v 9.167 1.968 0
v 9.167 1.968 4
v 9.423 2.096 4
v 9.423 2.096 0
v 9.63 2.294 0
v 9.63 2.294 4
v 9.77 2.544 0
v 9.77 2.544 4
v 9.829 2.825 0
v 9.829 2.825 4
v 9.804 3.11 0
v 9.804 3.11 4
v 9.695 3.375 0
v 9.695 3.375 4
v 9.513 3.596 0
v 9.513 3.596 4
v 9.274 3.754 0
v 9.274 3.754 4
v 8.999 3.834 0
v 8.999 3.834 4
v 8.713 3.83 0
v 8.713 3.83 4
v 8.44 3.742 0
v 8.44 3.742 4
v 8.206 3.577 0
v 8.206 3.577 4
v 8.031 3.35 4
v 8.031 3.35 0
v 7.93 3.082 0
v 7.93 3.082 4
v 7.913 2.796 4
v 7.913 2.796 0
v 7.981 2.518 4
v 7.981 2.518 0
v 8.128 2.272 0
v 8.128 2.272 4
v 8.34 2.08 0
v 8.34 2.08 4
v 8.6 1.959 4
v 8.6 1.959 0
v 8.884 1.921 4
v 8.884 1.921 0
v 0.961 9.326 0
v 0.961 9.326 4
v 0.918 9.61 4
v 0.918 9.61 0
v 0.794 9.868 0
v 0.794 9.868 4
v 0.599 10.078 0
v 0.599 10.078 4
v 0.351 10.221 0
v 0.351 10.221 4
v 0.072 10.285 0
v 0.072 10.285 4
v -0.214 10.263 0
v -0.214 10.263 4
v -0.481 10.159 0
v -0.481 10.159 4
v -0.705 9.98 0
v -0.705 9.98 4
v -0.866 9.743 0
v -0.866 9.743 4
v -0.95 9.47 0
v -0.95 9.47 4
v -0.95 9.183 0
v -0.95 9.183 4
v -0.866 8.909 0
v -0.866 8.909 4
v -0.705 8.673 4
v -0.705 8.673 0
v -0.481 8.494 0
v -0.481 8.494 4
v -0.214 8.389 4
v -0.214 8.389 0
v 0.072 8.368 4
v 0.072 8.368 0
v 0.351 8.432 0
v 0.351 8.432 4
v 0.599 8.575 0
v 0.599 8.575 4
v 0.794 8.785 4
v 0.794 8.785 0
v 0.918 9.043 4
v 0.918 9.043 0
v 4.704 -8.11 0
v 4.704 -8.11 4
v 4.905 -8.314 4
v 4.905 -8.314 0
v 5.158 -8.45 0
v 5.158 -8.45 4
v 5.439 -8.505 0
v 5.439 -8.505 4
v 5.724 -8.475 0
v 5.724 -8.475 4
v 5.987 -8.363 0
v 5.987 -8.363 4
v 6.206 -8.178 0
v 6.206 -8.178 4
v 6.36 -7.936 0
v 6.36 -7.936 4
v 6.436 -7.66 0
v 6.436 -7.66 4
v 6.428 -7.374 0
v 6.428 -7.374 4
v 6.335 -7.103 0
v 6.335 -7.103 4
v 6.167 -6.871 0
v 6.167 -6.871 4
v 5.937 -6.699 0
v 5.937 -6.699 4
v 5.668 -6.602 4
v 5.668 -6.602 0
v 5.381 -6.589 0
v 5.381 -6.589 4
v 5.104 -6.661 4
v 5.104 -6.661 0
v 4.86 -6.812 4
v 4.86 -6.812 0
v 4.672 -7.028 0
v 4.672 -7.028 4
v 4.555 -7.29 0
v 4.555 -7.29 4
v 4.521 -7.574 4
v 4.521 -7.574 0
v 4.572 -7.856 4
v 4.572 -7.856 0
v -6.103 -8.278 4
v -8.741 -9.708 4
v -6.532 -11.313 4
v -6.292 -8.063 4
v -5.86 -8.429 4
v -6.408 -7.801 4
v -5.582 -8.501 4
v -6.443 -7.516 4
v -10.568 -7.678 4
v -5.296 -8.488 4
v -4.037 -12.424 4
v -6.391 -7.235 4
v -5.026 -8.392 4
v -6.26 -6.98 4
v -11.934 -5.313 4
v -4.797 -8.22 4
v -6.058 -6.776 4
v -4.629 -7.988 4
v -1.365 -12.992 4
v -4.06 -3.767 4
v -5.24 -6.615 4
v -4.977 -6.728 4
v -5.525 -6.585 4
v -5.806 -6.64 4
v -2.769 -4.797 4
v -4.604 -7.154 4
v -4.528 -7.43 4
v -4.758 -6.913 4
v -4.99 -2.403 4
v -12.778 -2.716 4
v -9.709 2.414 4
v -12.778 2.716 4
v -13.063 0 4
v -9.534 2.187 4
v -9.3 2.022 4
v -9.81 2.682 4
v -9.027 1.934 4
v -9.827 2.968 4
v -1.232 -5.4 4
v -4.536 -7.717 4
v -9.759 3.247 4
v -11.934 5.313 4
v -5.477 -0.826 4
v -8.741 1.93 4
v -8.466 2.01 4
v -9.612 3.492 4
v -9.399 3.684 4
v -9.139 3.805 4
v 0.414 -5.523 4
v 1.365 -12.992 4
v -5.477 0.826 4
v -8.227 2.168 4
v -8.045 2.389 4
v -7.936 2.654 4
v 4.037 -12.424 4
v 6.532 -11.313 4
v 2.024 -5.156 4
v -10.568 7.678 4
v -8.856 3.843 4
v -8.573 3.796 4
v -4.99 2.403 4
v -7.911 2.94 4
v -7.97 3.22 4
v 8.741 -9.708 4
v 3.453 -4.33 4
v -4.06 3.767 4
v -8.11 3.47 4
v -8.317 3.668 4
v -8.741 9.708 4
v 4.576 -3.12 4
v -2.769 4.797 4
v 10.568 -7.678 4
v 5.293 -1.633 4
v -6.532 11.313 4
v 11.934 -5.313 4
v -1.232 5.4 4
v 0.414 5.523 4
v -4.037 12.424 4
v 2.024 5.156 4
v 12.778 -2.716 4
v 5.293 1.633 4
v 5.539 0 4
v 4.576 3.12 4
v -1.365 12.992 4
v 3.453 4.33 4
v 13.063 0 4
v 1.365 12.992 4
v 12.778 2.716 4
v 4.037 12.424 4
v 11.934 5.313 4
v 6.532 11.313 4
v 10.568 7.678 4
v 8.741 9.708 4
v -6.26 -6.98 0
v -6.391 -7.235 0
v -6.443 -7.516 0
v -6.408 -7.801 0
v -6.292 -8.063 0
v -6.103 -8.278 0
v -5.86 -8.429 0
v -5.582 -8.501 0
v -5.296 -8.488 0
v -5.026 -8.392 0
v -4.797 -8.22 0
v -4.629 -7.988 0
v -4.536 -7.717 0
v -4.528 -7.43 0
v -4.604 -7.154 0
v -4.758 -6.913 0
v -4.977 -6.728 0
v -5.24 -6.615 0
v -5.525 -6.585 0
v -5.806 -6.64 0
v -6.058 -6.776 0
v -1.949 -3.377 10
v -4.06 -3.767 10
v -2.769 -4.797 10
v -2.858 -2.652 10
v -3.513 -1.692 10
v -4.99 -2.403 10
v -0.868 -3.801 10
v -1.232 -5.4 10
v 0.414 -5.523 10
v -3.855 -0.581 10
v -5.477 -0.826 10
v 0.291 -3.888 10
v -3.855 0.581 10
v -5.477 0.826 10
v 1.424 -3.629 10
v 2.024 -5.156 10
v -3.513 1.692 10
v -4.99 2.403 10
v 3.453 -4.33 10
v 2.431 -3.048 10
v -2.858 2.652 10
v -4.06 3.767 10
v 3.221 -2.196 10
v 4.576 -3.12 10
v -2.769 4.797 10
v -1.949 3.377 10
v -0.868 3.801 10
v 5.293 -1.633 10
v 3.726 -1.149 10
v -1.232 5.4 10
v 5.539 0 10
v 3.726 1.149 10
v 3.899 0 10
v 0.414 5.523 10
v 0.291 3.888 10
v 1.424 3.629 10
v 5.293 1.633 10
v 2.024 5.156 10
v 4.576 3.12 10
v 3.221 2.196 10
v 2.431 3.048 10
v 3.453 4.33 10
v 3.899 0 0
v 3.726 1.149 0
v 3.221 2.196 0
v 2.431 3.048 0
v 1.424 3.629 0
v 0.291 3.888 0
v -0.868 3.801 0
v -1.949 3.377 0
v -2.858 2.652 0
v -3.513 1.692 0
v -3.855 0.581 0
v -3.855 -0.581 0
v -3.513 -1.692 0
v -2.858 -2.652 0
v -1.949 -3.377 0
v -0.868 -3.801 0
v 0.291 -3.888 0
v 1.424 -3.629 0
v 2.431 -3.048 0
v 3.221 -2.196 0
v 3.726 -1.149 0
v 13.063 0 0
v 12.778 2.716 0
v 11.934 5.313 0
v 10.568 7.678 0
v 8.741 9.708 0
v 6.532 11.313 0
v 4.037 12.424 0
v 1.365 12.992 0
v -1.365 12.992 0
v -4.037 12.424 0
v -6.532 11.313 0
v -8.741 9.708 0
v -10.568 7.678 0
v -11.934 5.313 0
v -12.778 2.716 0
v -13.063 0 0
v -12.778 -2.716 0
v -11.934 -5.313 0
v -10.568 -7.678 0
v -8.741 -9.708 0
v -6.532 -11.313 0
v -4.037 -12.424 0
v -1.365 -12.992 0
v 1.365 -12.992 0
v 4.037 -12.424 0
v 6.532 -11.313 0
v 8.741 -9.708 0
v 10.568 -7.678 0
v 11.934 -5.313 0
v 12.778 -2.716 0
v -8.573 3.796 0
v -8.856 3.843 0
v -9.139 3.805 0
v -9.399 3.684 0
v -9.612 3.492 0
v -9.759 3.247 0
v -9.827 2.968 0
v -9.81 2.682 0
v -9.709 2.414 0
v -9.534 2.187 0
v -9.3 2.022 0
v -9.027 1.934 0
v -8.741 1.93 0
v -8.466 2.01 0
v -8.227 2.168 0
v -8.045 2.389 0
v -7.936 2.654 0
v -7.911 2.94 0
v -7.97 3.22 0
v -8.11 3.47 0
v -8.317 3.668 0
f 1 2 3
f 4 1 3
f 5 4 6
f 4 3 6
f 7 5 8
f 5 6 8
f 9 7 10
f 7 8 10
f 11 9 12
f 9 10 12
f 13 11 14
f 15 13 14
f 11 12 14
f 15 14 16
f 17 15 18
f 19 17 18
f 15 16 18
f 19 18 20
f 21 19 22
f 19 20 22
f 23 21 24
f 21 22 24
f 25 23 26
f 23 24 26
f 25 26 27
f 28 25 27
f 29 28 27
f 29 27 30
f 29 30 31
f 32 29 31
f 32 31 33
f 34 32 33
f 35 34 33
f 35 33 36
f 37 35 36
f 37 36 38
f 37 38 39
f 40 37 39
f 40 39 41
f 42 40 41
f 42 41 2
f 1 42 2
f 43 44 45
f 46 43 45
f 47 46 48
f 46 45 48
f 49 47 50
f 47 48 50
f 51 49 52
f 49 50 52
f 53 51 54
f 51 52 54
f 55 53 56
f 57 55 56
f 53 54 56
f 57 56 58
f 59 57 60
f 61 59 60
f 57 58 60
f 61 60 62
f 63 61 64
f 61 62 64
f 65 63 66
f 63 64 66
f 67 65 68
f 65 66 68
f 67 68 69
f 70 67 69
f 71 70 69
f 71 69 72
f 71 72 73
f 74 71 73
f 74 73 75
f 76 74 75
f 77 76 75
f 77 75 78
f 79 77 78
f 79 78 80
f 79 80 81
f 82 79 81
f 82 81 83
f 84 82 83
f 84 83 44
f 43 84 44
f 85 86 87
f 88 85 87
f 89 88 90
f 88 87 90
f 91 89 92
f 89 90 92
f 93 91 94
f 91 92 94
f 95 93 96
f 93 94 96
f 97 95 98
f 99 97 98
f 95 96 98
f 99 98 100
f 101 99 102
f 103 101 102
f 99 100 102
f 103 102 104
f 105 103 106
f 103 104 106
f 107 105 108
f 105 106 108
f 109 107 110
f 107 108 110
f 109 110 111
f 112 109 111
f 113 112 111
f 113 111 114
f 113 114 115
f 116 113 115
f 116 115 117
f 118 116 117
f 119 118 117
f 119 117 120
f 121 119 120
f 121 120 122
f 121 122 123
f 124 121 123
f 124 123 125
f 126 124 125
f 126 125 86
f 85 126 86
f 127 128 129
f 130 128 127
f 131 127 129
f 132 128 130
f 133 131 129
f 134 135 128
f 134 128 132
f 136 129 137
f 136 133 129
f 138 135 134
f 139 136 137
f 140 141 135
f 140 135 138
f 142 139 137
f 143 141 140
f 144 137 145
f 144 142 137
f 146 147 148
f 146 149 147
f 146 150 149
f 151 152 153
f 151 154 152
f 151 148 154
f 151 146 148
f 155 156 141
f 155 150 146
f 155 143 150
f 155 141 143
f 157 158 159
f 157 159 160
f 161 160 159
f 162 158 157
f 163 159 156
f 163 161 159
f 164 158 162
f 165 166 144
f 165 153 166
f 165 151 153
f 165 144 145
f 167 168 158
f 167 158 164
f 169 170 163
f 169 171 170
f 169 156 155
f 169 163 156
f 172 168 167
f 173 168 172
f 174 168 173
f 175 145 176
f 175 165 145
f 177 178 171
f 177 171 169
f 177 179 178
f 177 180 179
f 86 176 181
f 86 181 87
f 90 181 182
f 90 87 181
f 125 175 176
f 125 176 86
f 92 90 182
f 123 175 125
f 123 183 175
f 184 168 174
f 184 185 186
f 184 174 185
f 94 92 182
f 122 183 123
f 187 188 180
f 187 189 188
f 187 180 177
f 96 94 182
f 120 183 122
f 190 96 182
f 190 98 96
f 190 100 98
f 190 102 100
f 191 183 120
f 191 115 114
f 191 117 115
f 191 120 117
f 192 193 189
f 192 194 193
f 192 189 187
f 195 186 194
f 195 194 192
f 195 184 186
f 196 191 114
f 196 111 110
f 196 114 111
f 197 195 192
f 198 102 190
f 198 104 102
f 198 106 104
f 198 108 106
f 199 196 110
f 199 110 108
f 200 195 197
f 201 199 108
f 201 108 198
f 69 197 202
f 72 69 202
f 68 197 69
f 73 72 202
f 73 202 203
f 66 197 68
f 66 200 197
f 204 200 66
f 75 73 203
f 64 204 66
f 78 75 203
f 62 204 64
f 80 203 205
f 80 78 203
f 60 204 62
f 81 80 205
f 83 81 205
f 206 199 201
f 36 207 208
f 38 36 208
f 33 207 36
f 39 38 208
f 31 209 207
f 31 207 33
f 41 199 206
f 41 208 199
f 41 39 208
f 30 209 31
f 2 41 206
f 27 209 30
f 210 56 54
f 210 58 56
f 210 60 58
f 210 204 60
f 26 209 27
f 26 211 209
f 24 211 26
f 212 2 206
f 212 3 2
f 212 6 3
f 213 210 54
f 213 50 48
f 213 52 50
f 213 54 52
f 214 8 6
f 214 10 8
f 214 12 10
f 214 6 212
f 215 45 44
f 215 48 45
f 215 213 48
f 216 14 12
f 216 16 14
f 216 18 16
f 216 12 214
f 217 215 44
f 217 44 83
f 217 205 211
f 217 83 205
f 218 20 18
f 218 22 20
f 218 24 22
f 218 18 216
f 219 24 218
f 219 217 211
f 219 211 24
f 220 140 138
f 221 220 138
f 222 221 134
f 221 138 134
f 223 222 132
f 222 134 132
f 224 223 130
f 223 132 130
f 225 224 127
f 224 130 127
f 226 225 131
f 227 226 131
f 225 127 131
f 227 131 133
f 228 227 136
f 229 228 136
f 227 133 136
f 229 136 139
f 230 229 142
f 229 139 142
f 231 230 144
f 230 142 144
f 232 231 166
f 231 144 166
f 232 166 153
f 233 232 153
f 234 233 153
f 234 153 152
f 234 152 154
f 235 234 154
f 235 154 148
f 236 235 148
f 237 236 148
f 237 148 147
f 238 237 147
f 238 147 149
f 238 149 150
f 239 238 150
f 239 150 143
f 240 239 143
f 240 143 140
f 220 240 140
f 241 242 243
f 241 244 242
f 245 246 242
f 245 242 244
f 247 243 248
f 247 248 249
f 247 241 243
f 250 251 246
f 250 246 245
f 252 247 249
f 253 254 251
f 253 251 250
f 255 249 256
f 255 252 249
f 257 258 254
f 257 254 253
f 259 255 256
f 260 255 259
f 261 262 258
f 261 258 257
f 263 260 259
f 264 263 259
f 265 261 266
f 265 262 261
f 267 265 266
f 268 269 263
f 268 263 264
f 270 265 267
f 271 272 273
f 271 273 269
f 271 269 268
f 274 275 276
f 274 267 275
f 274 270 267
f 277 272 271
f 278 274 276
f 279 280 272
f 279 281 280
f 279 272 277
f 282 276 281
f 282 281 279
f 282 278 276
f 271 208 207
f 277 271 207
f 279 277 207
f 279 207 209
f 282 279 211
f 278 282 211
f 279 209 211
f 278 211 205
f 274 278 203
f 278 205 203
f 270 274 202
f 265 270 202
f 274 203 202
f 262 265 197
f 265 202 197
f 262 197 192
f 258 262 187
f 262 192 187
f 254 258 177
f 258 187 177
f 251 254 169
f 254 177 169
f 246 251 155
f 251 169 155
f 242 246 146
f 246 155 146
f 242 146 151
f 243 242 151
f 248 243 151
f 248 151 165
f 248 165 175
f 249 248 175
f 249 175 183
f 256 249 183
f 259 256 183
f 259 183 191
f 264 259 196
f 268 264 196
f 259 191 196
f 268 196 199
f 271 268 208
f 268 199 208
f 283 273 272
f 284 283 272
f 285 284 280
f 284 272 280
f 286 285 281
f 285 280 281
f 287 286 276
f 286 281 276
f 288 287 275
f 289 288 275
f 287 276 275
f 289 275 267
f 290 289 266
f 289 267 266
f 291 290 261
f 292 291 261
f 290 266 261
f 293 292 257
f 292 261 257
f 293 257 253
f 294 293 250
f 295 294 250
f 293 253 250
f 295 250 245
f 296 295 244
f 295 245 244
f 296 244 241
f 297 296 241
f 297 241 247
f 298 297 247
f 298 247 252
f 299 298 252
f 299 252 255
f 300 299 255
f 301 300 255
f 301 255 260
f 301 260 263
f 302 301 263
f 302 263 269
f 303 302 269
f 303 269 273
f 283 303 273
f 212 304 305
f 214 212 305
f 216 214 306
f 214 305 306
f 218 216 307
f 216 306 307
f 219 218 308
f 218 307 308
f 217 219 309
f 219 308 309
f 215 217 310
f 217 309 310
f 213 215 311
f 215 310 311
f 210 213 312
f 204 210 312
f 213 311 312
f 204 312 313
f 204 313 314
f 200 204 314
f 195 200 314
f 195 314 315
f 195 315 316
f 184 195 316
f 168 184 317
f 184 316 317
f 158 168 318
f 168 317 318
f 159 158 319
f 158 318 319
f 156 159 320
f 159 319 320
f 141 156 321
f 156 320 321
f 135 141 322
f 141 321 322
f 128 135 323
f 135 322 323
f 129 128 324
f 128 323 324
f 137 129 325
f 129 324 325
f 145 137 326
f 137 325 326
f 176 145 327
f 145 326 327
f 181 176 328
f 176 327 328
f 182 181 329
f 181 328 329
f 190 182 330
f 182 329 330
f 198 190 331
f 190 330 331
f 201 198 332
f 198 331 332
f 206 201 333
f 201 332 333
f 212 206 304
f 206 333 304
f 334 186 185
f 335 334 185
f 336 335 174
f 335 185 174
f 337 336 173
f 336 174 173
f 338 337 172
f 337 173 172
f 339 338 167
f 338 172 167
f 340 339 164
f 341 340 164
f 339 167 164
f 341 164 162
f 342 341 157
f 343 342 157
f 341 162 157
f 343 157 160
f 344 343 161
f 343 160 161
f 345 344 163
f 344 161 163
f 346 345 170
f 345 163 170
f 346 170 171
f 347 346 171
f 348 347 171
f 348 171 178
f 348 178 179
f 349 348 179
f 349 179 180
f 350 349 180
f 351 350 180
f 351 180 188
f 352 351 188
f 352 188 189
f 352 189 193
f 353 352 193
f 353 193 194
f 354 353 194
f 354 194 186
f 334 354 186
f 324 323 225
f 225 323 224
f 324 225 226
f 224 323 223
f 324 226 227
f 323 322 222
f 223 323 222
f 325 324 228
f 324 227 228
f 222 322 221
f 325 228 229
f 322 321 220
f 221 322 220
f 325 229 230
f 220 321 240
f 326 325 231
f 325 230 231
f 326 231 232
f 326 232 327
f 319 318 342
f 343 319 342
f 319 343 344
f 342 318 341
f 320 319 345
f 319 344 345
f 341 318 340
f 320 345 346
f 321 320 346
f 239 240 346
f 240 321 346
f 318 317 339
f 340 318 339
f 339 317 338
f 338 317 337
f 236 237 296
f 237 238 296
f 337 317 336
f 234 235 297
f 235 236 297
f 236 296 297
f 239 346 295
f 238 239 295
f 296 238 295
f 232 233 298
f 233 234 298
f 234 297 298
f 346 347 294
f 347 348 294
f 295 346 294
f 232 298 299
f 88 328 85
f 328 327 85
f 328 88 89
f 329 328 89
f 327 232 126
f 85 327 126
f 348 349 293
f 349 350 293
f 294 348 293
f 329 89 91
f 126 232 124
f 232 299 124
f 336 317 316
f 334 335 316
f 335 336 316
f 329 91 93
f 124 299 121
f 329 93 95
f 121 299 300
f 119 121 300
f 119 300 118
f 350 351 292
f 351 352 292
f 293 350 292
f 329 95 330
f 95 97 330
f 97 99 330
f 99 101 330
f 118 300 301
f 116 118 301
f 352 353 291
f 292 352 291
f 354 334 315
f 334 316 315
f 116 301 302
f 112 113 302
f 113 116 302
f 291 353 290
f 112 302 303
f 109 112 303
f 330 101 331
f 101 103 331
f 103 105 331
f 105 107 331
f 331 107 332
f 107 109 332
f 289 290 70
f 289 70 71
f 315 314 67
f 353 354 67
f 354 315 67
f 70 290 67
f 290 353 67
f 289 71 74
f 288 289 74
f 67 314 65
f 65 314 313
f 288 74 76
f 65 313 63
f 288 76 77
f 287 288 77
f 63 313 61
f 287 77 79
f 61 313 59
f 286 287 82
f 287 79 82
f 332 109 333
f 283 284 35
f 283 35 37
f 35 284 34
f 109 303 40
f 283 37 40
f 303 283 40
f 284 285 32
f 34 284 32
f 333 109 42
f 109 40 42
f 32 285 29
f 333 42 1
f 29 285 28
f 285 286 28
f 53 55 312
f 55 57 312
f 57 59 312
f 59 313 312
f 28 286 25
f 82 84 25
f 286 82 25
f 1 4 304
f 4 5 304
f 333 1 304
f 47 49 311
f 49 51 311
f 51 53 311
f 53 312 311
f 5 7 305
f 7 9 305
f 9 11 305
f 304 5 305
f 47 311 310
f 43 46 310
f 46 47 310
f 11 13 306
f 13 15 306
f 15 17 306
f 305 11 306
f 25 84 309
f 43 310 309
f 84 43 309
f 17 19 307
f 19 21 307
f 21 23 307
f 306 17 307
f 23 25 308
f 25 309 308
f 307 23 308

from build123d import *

# Parameters (mm, degrees)
SKETCH_R           = 13.063078
PAD_DEPTH          = 4
SKETCH001_R        = 0.961125
POCKET_DEPTH       = 78.328708
POLARPATTERN_COUNT = 5
SKETCH002_R        = 5.538718
PAD001_DEPTH       = 6
SKETCH003_R        = 3.898849
POCKET001_DEPTH    = 10.001


with BuildPart() as part:
    # Sketch → Pad (new body)
    with BuildSketch(Plane.XY):
        Circle(SKETCH_R)
    extrude(amount=PAD_DEPTH)

    # Sketch001 (on DatumPlane) → Pocket (cut, through all)
    with BuildSketch(Plane.XY.offset(4)):
        with Locations((0, 9.326428)):
            Circle(SKETCH001_R)
    pocket = extrude(amount=-POCKET_DEPTH, mode=Mode.SUBTRACT)

    # PolarPattern: Pocket ×5 about axis
    polarpattern_axis = Axis((0, 0, 4), (0, 0, 1))
    for i in range(1, POLARPATTERN_COUNT):
        add(pocket.rotate(polarpattern_axis, i * 360 / POLARPATTERN_COUNT), mode=Mode.SUBTRACT)

    # Sketch002 (on DatumPlane) → Pad001 (join)
    with BuildSketch(Plane.XY.offset(4)):
        Circle(SKETCH002_R)
    extrude(amount=PAD001_DEPTH)

    # Sketch003 (on DatumPlane) → Pocket001 (cut, through all)
    with BuildSketch(Plane.XY.offset(10)):
        Circle(SKETCH003_R)
    extrude(amount=-POCKET001_DEPTH, mode=Mode.SUBTRACT)


solid = part.part
